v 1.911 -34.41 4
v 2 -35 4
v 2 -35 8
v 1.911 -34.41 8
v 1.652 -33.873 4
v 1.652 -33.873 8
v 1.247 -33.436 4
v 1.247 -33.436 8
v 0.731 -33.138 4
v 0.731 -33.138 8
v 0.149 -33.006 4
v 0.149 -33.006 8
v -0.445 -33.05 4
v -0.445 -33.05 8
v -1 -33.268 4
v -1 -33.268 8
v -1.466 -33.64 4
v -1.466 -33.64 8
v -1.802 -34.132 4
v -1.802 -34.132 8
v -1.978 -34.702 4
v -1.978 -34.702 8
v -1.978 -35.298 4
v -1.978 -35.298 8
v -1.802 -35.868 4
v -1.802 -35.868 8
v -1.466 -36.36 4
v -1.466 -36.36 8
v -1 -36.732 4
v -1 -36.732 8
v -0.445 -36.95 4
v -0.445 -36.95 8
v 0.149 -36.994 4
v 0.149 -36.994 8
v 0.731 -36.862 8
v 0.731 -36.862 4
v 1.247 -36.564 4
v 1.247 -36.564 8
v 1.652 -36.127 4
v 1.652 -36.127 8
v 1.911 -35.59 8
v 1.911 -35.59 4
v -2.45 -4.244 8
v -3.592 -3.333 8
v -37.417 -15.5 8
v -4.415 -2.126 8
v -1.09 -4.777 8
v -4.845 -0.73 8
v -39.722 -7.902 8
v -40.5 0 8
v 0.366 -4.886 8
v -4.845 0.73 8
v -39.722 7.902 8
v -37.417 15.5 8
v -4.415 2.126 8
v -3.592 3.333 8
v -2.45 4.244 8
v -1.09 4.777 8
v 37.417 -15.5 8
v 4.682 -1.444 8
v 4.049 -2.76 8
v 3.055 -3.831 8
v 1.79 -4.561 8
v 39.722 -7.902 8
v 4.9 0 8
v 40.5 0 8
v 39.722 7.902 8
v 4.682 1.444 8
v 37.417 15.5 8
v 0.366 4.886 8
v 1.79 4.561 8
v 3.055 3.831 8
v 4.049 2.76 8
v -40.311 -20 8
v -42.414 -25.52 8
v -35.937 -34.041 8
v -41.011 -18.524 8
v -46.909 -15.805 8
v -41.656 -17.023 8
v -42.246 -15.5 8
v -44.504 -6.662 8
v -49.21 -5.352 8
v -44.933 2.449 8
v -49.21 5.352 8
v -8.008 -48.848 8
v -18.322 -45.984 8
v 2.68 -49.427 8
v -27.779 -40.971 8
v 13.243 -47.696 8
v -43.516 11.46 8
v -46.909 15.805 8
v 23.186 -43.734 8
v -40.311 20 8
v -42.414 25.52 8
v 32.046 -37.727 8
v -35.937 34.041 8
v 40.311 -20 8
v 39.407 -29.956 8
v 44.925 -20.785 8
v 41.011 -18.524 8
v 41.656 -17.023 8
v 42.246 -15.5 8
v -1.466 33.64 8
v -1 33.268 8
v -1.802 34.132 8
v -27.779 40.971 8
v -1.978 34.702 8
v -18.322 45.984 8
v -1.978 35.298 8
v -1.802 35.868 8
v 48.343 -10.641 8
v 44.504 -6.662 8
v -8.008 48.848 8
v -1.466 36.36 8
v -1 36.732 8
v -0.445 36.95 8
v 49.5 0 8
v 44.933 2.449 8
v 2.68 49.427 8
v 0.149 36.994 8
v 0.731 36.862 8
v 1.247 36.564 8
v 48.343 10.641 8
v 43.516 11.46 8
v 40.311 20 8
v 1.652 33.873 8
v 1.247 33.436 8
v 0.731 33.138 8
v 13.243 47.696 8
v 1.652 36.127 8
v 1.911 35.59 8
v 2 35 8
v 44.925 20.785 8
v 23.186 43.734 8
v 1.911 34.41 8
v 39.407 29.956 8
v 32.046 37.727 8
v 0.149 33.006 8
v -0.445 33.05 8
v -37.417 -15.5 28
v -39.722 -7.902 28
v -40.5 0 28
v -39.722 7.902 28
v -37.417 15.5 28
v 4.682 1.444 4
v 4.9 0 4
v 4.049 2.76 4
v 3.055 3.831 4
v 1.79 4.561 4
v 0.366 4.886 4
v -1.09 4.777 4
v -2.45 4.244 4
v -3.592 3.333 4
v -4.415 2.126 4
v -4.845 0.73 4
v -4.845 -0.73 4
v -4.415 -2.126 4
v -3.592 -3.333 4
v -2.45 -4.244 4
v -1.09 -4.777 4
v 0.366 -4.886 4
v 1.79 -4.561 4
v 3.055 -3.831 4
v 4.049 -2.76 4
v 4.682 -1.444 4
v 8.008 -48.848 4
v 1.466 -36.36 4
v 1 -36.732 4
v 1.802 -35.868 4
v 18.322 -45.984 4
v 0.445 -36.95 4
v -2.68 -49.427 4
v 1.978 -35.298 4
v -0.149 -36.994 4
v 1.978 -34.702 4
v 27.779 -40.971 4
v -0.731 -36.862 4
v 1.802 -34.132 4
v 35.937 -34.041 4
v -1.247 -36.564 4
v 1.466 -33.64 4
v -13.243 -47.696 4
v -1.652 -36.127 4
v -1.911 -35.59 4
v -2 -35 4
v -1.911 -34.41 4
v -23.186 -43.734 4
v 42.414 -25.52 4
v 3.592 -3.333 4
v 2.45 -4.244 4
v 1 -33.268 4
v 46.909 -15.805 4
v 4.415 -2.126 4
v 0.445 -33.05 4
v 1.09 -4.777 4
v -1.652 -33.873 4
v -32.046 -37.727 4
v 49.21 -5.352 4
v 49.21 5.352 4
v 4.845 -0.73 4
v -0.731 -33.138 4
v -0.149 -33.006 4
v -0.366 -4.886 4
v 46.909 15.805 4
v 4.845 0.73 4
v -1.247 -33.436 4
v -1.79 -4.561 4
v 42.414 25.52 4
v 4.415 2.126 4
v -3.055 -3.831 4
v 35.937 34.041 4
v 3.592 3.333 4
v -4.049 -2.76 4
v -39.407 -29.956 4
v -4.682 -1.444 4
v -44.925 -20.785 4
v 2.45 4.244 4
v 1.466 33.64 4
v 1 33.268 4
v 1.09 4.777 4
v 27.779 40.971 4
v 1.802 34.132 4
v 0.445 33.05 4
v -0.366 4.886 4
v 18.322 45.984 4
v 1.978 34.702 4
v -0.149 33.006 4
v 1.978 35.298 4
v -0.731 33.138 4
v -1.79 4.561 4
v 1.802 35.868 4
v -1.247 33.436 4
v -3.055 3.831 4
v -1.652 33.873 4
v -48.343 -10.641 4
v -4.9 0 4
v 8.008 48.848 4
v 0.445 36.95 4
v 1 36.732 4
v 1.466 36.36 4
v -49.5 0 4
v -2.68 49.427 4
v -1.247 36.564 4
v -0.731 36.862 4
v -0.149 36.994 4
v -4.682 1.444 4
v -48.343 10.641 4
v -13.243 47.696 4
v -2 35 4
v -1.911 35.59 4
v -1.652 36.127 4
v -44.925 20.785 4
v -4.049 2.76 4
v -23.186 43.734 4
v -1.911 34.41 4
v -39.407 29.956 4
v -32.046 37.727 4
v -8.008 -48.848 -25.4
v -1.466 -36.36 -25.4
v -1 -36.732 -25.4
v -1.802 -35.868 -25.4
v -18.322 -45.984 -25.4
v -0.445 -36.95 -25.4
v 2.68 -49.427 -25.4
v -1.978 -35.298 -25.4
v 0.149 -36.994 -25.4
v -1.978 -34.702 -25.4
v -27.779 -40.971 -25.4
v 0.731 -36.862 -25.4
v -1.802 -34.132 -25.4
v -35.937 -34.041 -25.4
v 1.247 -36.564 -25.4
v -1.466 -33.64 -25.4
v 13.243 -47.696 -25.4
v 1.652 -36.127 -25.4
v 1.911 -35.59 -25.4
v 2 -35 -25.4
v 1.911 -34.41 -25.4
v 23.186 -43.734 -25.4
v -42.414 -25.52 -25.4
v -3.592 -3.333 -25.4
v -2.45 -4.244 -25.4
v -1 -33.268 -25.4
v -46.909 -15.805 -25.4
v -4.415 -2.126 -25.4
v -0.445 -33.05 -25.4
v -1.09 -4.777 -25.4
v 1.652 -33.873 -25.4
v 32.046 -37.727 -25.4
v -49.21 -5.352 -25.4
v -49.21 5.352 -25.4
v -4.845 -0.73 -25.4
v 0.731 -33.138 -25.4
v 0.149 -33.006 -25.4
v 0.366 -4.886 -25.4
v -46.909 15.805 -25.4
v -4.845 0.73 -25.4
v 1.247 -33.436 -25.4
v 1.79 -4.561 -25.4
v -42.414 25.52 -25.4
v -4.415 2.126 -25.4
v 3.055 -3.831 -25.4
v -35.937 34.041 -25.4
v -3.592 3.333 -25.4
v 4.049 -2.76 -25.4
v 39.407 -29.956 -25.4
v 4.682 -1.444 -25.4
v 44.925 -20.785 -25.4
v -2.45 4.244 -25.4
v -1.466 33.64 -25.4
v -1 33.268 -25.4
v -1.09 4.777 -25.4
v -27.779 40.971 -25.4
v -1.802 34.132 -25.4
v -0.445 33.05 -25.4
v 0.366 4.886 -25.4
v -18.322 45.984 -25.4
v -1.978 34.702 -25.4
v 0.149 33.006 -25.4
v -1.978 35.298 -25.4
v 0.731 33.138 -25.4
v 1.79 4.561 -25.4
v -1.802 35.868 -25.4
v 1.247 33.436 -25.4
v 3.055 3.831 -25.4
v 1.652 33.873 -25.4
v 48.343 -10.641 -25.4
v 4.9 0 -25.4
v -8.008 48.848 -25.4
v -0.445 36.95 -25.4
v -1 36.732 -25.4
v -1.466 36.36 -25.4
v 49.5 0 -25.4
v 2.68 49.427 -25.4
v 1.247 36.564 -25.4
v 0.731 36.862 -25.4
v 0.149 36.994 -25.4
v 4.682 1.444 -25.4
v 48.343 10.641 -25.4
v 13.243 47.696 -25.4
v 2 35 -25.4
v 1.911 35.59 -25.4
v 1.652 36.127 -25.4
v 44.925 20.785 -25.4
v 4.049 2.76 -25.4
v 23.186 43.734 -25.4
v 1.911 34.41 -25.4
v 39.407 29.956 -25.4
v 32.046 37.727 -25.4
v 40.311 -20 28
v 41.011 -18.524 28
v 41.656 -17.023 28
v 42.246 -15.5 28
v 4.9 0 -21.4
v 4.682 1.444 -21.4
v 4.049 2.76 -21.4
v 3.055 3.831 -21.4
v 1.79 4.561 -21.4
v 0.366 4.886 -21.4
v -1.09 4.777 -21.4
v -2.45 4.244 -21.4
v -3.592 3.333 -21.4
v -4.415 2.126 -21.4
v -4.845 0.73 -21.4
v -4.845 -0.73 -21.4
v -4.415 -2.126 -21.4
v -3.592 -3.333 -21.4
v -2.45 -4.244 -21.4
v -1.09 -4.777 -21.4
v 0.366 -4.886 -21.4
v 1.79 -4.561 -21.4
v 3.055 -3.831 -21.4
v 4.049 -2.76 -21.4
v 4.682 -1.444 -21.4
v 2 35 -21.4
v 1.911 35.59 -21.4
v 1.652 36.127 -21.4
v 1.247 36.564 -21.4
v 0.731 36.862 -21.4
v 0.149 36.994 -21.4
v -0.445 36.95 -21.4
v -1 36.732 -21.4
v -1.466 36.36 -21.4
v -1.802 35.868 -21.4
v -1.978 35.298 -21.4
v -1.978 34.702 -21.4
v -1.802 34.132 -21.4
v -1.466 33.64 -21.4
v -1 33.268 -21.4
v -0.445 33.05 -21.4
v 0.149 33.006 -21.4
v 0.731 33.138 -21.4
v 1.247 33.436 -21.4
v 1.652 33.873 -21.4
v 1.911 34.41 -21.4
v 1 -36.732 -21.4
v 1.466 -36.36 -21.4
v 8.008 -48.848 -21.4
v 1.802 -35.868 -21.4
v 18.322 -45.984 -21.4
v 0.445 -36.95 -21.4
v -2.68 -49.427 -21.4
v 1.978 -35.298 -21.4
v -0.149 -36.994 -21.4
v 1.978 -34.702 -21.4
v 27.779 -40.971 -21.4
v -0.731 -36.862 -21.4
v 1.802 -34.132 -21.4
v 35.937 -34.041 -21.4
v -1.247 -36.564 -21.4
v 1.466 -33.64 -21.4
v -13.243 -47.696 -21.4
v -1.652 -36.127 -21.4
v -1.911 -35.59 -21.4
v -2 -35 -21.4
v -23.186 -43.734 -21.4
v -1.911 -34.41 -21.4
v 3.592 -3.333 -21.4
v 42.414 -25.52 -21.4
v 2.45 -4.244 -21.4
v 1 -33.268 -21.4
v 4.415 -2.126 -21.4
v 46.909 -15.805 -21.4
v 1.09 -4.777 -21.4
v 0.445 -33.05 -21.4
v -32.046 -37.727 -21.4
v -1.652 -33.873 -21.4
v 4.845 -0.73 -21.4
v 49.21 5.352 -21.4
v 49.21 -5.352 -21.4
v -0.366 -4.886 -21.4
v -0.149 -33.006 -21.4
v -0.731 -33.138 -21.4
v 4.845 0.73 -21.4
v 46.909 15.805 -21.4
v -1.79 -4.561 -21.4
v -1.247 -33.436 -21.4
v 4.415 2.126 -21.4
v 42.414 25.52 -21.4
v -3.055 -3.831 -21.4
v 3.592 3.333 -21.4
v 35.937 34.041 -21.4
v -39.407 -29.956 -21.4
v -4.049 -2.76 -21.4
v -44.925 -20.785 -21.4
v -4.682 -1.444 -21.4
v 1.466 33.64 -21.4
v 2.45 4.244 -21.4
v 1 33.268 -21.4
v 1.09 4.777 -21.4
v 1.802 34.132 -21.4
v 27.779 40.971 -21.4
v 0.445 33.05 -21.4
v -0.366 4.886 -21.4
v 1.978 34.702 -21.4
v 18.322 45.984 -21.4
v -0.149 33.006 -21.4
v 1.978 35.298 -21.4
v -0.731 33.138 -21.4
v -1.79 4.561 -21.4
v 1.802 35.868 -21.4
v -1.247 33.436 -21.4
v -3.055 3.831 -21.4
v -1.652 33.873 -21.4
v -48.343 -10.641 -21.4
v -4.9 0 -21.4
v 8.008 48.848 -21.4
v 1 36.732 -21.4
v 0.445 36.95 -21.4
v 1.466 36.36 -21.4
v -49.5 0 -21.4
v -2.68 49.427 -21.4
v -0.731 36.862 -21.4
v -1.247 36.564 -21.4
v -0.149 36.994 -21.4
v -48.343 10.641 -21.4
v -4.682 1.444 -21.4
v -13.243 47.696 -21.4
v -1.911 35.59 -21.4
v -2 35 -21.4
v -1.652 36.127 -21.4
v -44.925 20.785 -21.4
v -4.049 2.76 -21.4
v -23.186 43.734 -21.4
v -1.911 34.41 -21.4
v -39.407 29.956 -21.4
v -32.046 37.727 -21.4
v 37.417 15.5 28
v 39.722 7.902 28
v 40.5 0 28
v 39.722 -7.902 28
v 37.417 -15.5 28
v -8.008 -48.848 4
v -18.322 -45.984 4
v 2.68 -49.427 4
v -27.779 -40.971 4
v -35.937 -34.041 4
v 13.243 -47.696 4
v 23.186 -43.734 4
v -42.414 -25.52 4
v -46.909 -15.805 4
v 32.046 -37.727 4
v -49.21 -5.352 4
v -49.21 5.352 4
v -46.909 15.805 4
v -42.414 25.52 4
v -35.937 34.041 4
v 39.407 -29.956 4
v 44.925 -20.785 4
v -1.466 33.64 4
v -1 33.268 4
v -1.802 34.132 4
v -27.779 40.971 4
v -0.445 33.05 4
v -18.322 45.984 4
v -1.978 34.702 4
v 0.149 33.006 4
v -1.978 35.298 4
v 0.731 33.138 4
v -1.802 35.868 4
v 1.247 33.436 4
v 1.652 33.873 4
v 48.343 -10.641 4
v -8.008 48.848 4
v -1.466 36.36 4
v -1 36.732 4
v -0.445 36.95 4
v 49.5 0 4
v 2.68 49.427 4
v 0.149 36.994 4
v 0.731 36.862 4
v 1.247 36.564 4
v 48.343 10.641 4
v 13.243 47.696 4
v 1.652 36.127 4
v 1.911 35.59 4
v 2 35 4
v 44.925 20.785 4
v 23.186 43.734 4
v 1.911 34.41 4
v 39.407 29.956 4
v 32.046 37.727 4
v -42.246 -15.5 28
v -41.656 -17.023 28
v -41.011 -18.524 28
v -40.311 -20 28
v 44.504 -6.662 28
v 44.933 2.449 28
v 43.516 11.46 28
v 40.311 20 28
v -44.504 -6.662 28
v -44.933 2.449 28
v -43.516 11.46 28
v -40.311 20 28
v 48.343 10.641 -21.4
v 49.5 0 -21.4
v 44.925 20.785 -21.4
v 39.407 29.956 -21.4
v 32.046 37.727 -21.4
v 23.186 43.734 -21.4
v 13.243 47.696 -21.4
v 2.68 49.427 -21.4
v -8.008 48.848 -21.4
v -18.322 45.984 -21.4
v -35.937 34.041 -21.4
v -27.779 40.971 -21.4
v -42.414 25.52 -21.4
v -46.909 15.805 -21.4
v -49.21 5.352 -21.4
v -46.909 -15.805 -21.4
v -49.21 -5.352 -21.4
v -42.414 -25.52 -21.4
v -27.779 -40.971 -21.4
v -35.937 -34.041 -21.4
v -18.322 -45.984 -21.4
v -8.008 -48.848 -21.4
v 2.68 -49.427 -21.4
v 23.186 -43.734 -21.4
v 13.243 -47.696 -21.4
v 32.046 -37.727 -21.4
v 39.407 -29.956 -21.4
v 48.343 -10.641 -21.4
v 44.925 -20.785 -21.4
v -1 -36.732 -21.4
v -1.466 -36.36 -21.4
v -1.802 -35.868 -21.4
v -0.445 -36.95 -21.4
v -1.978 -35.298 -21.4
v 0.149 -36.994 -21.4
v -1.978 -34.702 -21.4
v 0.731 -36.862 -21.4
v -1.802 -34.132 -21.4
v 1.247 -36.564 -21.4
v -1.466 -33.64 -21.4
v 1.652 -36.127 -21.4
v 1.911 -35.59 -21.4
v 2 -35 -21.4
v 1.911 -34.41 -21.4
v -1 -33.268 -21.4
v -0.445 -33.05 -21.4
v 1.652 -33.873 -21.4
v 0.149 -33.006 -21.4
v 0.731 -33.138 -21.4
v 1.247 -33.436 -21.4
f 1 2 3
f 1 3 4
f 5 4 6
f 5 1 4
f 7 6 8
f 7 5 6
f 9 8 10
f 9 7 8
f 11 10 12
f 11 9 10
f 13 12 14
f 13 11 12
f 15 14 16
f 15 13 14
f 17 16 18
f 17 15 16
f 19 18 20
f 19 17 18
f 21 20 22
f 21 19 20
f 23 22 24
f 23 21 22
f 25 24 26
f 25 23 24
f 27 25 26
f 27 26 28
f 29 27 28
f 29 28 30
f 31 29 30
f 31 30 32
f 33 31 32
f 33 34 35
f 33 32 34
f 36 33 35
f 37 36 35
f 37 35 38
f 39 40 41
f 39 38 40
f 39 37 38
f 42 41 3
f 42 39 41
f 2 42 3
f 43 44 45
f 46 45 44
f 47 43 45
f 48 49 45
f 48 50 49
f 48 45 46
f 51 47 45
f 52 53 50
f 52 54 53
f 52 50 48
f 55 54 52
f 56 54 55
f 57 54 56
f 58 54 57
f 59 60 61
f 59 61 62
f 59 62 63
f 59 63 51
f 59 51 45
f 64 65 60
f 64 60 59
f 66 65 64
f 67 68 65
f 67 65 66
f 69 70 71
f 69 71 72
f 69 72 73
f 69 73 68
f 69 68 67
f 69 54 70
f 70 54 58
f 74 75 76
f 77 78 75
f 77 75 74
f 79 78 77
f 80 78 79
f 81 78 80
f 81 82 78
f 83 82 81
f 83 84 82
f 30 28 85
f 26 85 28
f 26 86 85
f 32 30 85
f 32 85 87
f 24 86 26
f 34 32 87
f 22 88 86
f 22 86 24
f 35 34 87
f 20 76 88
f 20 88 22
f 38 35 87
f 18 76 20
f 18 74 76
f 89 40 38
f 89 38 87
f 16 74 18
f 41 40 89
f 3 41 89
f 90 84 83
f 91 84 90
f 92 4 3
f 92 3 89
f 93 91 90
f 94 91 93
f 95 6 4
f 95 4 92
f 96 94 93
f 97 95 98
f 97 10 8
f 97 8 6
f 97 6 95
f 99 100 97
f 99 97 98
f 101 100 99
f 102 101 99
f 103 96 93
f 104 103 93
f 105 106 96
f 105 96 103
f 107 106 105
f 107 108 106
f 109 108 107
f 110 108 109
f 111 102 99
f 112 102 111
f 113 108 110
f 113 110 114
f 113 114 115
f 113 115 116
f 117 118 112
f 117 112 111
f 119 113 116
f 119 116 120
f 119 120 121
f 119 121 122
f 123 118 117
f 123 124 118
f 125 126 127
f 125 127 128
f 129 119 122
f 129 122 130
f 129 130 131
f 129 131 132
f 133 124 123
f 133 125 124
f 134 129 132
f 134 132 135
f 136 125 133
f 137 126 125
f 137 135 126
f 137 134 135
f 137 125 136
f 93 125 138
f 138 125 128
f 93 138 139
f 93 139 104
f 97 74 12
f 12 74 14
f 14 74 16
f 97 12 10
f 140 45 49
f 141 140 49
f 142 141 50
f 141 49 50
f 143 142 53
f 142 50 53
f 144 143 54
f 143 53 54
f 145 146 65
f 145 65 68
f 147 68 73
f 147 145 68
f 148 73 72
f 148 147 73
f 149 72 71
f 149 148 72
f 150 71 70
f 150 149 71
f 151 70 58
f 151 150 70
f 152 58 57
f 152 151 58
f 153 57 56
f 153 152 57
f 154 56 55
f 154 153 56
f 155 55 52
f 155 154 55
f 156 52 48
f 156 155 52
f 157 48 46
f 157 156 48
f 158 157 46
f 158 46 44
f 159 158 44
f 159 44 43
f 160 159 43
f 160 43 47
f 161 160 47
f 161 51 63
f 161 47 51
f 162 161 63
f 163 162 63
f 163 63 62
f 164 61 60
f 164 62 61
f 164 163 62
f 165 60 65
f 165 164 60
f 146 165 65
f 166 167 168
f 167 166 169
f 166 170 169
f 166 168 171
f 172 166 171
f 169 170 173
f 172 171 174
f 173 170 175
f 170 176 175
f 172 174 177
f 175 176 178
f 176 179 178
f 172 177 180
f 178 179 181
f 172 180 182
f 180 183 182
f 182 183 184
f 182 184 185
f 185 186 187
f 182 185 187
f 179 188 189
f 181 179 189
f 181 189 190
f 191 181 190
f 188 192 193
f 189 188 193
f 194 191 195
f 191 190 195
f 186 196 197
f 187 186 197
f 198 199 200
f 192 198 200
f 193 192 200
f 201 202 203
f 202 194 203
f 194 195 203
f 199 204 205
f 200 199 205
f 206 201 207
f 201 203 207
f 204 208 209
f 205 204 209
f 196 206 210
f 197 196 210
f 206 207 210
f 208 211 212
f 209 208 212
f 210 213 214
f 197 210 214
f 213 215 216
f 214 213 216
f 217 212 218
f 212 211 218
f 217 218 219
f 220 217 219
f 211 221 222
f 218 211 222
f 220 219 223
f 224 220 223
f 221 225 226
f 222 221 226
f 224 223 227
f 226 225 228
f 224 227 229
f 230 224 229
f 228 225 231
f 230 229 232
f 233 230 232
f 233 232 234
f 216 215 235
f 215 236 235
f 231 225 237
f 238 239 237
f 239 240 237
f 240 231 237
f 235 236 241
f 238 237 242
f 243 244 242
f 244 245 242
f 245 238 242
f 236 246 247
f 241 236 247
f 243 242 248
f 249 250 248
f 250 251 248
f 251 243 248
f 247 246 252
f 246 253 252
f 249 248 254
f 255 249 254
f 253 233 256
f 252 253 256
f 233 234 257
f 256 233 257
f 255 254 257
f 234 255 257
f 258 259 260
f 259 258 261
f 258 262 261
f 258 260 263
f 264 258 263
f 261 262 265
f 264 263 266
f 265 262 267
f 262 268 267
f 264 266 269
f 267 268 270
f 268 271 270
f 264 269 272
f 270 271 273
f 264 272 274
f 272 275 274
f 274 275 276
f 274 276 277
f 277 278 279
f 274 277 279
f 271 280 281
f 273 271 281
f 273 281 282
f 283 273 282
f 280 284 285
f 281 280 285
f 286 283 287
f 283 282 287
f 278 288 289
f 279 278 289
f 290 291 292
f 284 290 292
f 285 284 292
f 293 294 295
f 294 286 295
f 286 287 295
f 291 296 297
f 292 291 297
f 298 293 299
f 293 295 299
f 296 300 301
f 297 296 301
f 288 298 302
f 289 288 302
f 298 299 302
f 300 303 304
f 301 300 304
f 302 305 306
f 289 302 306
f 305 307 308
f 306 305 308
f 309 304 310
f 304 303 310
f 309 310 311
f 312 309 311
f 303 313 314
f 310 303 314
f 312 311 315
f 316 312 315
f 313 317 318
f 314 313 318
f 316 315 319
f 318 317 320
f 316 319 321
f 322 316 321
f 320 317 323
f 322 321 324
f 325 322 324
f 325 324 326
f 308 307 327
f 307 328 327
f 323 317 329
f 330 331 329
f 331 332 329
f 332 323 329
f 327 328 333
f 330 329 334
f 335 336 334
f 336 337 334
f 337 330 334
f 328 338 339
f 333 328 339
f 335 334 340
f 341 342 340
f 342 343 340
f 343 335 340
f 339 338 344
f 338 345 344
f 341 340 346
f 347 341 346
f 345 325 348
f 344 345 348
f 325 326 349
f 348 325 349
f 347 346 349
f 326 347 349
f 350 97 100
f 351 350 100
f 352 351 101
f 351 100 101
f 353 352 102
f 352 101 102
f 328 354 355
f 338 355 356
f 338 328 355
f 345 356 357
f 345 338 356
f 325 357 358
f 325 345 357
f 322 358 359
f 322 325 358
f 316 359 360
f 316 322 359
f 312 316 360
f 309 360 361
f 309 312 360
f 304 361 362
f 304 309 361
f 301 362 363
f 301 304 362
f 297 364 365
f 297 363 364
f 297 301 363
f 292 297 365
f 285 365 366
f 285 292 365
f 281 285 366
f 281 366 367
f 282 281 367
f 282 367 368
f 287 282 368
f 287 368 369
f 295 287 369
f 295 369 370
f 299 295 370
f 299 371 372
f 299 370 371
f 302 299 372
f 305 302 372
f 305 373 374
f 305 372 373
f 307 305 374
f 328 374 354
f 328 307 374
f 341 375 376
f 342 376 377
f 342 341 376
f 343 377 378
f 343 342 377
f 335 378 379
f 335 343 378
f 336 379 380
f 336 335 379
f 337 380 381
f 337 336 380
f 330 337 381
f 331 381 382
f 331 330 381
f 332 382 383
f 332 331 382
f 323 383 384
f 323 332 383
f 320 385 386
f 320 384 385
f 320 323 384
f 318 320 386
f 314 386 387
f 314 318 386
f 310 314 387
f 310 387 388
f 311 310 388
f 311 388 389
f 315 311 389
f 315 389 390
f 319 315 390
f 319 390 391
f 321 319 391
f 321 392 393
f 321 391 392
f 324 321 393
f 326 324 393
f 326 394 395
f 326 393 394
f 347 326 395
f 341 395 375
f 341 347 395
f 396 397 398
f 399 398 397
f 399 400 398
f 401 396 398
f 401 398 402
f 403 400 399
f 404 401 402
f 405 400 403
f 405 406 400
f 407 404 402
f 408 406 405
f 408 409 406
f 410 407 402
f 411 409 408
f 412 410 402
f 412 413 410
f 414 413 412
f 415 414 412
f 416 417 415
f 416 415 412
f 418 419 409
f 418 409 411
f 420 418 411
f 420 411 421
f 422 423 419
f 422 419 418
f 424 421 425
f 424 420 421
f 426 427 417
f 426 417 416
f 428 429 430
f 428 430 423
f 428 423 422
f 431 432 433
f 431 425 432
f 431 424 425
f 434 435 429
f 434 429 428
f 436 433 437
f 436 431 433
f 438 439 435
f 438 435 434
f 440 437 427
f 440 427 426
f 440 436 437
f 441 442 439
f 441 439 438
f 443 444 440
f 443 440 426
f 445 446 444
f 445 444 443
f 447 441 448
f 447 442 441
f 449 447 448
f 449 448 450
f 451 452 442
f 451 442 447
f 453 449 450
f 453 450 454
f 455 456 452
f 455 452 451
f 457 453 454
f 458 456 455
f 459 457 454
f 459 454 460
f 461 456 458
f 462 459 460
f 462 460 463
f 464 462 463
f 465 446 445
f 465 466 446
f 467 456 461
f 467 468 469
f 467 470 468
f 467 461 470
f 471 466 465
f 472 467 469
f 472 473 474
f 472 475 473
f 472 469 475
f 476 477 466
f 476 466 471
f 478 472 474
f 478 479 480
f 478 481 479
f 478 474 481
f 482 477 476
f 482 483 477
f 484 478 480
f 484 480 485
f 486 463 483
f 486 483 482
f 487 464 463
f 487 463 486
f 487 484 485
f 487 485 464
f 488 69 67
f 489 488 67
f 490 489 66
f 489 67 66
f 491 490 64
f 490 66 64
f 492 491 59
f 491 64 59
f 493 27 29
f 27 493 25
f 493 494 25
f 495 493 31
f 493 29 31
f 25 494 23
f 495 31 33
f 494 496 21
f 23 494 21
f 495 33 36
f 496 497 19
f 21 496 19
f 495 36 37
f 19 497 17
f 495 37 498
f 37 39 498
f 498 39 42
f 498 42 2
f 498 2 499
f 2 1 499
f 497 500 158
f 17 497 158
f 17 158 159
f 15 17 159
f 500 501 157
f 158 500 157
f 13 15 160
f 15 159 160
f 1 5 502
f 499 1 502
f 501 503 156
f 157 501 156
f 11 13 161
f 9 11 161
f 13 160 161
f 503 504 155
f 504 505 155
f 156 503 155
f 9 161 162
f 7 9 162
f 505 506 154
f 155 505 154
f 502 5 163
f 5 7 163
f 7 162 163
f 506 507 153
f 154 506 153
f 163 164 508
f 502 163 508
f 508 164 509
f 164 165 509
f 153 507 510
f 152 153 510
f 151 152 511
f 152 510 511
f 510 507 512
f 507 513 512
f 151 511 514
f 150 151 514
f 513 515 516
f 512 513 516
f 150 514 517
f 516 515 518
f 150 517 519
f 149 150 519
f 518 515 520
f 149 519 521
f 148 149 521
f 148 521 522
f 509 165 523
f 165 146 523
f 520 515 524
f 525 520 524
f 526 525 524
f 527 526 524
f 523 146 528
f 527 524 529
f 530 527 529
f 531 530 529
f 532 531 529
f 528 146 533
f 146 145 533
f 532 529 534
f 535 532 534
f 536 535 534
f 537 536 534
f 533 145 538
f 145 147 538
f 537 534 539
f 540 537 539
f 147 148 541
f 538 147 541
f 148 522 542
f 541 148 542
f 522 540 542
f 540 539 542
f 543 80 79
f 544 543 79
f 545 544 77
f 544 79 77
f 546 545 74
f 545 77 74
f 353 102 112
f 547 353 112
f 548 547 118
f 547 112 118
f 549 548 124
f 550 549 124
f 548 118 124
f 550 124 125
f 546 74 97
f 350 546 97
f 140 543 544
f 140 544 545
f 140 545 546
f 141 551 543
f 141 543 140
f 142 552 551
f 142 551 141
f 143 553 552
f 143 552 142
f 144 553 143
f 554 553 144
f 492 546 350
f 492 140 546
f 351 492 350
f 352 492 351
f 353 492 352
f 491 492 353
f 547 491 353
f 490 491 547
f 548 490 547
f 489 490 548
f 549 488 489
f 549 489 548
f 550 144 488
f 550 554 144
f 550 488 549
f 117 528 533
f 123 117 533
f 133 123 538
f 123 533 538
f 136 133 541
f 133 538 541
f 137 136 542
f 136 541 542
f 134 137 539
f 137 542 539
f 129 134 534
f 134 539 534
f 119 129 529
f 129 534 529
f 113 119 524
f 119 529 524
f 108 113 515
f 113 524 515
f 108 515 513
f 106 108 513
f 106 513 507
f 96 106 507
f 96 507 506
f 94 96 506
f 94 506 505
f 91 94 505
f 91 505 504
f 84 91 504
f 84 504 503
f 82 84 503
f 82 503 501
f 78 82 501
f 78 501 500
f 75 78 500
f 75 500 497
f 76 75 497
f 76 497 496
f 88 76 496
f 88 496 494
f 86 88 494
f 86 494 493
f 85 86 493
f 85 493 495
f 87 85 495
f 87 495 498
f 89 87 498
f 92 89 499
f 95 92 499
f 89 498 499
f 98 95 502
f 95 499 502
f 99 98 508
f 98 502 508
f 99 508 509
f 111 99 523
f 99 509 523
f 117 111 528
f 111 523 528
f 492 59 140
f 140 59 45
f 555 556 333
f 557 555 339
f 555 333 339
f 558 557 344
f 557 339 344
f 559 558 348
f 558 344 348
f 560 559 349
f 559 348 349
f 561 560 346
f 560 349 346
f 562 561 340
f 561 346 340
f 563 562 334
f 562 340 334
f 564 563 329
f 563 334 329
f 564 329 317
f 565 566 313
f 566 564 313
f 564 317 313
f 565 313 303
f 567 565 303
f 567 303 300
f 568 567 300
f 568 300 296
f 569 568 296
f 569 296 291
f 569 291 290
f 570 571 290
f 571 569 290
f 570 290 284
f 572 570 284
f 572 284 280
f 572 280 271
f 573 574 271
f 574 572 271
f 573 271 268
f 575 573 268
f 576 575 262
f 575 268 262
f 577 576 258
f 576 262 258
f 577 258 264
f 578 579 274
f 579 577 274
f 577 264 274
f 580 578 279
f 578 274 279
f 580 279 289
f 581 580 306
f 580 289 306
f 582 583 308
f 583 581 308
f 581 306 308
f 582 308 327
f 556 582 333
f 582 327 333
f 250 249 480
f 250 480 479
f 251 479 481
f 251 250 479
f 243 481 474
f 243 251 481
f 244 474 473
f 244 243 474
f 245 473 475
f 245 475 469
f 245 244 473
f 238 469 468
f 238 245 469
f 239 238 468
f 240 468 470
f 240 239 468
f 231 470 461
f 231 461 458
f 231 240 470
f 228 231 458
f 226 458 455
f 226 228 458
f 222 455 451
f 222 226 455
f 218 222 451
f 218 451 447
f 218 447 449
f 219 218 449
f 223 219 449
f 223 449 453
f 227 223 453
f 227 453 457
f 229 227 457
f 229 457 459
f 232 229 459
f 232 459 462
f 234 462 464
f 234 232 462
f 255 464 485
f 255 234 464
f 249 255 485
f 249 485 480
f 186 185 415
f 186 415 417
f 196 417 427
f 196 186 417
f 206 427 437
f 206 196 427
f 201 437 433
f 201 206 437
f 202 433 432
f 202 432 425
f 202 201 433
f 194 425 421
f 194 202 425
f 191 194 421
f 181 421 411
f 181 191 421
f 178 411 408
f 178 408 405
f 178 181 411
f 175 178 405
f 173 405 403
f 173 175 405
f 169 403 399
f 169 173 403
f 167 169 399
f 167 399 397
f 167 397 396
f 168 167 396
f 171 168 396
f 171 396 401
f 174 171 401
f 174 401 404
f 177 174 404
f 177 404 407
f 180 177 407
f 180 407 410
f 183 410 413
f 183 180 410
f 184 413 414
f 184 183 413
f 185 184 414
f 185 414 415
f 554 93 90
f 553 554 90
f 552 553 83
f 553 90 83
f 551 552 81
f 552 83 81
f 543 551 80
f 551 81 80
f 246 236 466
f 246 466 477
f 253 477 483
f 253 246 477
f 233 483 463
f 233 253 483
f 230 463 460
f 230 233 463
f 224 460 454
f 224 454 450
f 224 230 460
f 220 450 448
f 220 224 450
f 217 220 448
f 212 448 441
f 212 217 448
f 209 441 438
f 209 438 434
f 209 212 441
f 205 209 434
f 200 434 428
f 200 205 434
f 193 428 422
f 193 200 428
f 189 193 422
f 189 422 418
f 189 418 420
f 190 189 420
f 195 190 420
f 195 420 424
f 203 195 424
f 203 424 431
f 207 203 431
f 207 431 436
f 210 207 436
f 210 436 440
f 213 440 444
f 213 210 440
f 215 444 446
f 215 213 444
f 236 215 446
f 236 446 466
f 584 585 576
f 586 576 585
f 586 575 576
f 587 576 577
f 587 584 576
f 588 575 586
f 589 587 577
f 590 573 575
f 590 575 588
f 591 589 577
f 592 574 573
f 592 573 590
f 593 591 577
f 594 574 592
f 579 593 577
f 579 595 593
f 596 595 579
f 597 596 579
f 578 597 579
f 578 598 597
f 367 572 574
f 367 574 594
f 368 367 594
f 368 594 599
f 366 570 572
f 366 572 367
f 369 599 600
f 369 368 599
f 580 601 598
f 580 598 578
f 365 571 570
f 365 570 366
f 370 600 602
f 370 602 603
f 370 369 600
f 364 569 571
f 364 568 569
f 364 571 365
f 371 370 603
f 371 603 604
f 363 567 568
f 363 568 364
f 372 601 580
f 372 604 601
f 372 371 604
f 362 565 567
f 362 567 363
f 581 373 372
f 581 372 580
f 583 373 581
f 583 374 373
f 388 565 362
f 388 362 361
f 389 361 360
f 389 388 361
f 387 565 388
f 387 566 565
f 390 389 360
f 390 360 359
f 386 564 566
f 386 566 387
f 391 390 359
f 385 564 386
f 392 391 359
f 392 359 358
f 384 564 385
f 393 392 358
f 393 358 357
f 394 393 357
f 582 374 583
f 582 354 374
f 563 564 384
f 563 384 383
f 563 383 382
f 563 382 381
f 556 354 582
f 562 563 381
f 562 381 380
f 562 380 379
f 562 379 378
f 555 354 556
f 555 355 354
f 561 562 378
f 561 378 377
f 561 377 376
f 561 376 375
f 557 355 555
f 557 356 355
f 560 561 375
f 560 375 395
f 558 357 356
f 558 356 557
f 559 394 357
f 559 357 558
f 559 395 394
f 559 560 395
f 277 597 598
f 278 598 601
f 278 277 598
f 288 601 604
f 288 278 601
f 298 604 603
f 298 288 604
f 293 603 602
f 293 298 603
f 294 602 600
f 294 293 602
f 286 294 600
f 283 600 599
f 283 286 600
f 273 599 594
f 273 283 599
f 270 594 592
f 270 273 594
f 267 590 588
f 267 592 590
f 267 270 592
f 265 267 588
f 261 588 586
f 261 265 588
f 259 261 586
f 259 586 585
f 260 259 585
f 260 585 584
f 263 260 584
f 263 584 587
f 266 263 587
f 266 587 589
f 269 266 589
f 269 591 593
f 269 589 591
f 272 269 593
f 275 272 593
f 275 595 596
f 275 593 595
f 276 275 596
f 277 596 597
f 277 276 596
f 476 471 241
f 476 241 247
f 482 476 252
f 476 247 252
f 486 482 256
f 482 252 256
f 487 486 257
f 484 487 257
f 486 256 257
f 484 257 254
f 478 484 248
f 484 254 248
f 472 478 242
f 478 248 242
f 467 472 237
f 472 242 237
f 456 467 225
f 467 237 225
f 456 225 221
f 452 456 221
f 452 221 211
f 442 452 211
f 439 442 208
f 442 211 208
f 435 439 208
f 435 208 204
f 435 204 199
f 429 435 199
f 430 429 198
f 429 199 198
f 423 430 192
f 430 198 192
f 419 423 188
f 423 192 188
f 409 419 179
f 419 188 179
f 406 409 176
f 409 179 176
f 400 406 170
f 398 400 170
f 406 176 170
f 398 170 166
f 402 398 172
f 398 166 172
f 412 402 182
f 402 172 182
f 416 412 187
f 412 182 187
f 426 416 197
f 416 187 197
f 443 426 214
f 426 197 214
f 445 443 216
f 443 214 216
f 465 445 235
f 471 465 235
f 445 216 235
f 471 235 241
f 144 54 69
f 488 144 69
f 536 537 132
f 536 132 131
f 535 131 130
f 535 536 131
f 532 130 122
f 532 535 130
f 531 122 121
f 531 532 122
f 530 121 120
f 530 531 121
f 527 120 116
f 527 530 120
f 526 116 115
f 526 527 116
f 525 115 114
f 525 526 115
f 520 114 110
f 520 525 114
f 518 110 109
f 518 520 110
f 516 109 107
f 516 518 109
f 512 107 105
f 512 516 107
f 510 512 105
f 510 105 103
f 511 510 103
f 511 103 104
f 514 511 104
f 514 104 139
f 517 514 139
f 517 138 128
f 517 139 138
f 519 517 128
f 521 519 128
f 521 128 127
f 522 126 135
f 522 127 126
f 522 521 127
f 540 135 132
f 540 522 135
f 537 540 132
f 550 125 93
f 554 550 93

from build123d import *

# Parameters (mm, degrees)
SKETCH2_R           = 49.5
BOSS_EXTRUDE1_DEPTH = 8
SKETCH1_R           = 4.9
CUT_EXTRUDE1_DEPTH  = 29
BOSS_EXTRUDE2_DEPTH = 20
SKETCH1_14_R        = 2
CUT_EXTRUDE5_DEPTH  = 31
SKETCH6_R           = 49.5
SKETCH6_R_2         = 4.9
SKETCH6_R_3         = 2
BOSS_EXTRUDE3_DEPTH = 25.4


# Read off the part's stored shape, not the designer's step: Intersect1
with BuildPart() as part:
    # Sketch2 → Boss-Extrude1 (new body)
    with BuildSketch(Plane.XY):
        Circle(SKETCH2_R)
    extrude(amount=BOSS_EXTRUDE1_DEPTH)

    # Sketch1 → Cut-Extrude1 (cut)
    with BuildSketch(Plane(origin=(0, 0, 0), x_dir=(-1, 0, 0), z_dir=(0, 0, 1))):
        with Locations(Location((0, 0, 0), (0, 0, 180))):
            Circle(SKETCH1_R)
    extrude(amount=CUT_EXTRUDE1_DEPTH, mode=Mode.SUBTRACT)

    # Sketch4 → Boss-Extrude2 (add)
    with BuildSketch(Plane.XY.offset(8)):
        with BuildLine():
            Line((-37.416573868, 15.5), (0, 15.5))
            Line((0, 15.5), (0, 20))
            Line((0, 20), (-40.311288741, 20))
            ThreePointArc((-40.311288741, 20), (-44.933299804, 2.449197563), (-42.246301613, -15.5))
            Line((-42.246301613, -15.5), (-37.416573868, -15.5))
            ThreePointArc((-37.416573868, -15.5), (-40.5, 0), (-37.416573868, 15.5))
        make_face()
        with BuildLine():
            Line((-40.311288741, -20), (0, -20))
            Line((0, -20), (0, -15.5))
            Line((0, -15.5), (-37.416573868, -15.5))
            Line((-37.416573868, -15.5), (-42.246301613, -15.5))
            ThreePointArc((-42.246301613, -15.5), (-41.340070528, -17.776348576), (-40.311288741, -20))
        make_face()
        with BuildLine():
            Line((0, -15.5), (0, -20))
            Line((0, -20), (40.311288741, -20))
            ThreePointArc((40.311288741, -20), (41.340070528, -17.776348576), (42.246301613, -15.5))
            Line((42.246301613, -15.5), (37.416573868, -15.5))
            Line((37.416573868, -15.5), (0, -15.5))
        make_face()
        with BuildLine():
            Line((0, 20), (0, 15.5))
            Line((0, 15.5), (37.416573868, 15.5))
            ThreePointArc((37.416573868, 15.5), (40.5, 0), (37.416573868, -15.5))
            Line((37.416573868, -15.5), (42.246301613, -15.5))
            ThreePointArc((42.246301613, -15.5), (44.933299804, 2.449197563), (40.311288741, 20))
            Line((40.311288741, 20), (0, 20))
        make_face()
    extrude(amount=BOSS_EXTRUDE2_DEPTH)

    # Sketch1<14> → Cut-Extrude5 (cut)
    with BuildSketch(Plane(origin=(0, 0, 0), x_dir=(-1, 0, 0), z_dir=(0, 0, 1))):
        with Locations(Location((0, -35, 0), (0, 0, 180))):
            Circle(SKETCH1_14_R)
        with Locations(Location((0, 35, 0), (0, 0, 180))):
            Circle(SKETCH1_14_R)
    extrude(amount=CUT_EXTRUDE5_DEPTH, mode=Mode.SUBTRACT)


with BuildPart() as body_2:
    # Intersect1: the piece on the far side of the plane
    add(part.part)
    split(bisect_by=Plane.XY.offset(4), keep=Keep.BOTTOM)


with BuildPart() as part_1:
    add(part.part)

    # Intersect1
    split(bisect_by=Plane.XY.offset(4), keep=Keep.TOP)


with BuildPart() as body_2_1:
    # Body-Move/Copy1: moved
    add(body_2.part.moved(Location((0, 0, -25.4))))


with BuildPart() as body_3:
    # Sketch6 → Boss-Extrude3 (new body)
    with BuildSketch(Plane(origin=(0, 0, 4), x_dir=(-1, 0, 0), z_dir=(0, 0, -1))):
        Circle(SKETCH6_R)
        Circle(SKETCH6_R_2, mode=Mode.SUBTRACT)
        with Locations((0, -35)):
            Circle(SKETCH6_R_3, mode=Mode.SUBTRACT)
        with Locations((0, 35)):
            Circle(SKETCH6_R_3, mode=Mode.SUBTRACT)
    extrude(amount=BOSS_EXTRUDE3_DEPTH)


solid = Compound([part_1.part, body_2_1.part, body_3.part])
